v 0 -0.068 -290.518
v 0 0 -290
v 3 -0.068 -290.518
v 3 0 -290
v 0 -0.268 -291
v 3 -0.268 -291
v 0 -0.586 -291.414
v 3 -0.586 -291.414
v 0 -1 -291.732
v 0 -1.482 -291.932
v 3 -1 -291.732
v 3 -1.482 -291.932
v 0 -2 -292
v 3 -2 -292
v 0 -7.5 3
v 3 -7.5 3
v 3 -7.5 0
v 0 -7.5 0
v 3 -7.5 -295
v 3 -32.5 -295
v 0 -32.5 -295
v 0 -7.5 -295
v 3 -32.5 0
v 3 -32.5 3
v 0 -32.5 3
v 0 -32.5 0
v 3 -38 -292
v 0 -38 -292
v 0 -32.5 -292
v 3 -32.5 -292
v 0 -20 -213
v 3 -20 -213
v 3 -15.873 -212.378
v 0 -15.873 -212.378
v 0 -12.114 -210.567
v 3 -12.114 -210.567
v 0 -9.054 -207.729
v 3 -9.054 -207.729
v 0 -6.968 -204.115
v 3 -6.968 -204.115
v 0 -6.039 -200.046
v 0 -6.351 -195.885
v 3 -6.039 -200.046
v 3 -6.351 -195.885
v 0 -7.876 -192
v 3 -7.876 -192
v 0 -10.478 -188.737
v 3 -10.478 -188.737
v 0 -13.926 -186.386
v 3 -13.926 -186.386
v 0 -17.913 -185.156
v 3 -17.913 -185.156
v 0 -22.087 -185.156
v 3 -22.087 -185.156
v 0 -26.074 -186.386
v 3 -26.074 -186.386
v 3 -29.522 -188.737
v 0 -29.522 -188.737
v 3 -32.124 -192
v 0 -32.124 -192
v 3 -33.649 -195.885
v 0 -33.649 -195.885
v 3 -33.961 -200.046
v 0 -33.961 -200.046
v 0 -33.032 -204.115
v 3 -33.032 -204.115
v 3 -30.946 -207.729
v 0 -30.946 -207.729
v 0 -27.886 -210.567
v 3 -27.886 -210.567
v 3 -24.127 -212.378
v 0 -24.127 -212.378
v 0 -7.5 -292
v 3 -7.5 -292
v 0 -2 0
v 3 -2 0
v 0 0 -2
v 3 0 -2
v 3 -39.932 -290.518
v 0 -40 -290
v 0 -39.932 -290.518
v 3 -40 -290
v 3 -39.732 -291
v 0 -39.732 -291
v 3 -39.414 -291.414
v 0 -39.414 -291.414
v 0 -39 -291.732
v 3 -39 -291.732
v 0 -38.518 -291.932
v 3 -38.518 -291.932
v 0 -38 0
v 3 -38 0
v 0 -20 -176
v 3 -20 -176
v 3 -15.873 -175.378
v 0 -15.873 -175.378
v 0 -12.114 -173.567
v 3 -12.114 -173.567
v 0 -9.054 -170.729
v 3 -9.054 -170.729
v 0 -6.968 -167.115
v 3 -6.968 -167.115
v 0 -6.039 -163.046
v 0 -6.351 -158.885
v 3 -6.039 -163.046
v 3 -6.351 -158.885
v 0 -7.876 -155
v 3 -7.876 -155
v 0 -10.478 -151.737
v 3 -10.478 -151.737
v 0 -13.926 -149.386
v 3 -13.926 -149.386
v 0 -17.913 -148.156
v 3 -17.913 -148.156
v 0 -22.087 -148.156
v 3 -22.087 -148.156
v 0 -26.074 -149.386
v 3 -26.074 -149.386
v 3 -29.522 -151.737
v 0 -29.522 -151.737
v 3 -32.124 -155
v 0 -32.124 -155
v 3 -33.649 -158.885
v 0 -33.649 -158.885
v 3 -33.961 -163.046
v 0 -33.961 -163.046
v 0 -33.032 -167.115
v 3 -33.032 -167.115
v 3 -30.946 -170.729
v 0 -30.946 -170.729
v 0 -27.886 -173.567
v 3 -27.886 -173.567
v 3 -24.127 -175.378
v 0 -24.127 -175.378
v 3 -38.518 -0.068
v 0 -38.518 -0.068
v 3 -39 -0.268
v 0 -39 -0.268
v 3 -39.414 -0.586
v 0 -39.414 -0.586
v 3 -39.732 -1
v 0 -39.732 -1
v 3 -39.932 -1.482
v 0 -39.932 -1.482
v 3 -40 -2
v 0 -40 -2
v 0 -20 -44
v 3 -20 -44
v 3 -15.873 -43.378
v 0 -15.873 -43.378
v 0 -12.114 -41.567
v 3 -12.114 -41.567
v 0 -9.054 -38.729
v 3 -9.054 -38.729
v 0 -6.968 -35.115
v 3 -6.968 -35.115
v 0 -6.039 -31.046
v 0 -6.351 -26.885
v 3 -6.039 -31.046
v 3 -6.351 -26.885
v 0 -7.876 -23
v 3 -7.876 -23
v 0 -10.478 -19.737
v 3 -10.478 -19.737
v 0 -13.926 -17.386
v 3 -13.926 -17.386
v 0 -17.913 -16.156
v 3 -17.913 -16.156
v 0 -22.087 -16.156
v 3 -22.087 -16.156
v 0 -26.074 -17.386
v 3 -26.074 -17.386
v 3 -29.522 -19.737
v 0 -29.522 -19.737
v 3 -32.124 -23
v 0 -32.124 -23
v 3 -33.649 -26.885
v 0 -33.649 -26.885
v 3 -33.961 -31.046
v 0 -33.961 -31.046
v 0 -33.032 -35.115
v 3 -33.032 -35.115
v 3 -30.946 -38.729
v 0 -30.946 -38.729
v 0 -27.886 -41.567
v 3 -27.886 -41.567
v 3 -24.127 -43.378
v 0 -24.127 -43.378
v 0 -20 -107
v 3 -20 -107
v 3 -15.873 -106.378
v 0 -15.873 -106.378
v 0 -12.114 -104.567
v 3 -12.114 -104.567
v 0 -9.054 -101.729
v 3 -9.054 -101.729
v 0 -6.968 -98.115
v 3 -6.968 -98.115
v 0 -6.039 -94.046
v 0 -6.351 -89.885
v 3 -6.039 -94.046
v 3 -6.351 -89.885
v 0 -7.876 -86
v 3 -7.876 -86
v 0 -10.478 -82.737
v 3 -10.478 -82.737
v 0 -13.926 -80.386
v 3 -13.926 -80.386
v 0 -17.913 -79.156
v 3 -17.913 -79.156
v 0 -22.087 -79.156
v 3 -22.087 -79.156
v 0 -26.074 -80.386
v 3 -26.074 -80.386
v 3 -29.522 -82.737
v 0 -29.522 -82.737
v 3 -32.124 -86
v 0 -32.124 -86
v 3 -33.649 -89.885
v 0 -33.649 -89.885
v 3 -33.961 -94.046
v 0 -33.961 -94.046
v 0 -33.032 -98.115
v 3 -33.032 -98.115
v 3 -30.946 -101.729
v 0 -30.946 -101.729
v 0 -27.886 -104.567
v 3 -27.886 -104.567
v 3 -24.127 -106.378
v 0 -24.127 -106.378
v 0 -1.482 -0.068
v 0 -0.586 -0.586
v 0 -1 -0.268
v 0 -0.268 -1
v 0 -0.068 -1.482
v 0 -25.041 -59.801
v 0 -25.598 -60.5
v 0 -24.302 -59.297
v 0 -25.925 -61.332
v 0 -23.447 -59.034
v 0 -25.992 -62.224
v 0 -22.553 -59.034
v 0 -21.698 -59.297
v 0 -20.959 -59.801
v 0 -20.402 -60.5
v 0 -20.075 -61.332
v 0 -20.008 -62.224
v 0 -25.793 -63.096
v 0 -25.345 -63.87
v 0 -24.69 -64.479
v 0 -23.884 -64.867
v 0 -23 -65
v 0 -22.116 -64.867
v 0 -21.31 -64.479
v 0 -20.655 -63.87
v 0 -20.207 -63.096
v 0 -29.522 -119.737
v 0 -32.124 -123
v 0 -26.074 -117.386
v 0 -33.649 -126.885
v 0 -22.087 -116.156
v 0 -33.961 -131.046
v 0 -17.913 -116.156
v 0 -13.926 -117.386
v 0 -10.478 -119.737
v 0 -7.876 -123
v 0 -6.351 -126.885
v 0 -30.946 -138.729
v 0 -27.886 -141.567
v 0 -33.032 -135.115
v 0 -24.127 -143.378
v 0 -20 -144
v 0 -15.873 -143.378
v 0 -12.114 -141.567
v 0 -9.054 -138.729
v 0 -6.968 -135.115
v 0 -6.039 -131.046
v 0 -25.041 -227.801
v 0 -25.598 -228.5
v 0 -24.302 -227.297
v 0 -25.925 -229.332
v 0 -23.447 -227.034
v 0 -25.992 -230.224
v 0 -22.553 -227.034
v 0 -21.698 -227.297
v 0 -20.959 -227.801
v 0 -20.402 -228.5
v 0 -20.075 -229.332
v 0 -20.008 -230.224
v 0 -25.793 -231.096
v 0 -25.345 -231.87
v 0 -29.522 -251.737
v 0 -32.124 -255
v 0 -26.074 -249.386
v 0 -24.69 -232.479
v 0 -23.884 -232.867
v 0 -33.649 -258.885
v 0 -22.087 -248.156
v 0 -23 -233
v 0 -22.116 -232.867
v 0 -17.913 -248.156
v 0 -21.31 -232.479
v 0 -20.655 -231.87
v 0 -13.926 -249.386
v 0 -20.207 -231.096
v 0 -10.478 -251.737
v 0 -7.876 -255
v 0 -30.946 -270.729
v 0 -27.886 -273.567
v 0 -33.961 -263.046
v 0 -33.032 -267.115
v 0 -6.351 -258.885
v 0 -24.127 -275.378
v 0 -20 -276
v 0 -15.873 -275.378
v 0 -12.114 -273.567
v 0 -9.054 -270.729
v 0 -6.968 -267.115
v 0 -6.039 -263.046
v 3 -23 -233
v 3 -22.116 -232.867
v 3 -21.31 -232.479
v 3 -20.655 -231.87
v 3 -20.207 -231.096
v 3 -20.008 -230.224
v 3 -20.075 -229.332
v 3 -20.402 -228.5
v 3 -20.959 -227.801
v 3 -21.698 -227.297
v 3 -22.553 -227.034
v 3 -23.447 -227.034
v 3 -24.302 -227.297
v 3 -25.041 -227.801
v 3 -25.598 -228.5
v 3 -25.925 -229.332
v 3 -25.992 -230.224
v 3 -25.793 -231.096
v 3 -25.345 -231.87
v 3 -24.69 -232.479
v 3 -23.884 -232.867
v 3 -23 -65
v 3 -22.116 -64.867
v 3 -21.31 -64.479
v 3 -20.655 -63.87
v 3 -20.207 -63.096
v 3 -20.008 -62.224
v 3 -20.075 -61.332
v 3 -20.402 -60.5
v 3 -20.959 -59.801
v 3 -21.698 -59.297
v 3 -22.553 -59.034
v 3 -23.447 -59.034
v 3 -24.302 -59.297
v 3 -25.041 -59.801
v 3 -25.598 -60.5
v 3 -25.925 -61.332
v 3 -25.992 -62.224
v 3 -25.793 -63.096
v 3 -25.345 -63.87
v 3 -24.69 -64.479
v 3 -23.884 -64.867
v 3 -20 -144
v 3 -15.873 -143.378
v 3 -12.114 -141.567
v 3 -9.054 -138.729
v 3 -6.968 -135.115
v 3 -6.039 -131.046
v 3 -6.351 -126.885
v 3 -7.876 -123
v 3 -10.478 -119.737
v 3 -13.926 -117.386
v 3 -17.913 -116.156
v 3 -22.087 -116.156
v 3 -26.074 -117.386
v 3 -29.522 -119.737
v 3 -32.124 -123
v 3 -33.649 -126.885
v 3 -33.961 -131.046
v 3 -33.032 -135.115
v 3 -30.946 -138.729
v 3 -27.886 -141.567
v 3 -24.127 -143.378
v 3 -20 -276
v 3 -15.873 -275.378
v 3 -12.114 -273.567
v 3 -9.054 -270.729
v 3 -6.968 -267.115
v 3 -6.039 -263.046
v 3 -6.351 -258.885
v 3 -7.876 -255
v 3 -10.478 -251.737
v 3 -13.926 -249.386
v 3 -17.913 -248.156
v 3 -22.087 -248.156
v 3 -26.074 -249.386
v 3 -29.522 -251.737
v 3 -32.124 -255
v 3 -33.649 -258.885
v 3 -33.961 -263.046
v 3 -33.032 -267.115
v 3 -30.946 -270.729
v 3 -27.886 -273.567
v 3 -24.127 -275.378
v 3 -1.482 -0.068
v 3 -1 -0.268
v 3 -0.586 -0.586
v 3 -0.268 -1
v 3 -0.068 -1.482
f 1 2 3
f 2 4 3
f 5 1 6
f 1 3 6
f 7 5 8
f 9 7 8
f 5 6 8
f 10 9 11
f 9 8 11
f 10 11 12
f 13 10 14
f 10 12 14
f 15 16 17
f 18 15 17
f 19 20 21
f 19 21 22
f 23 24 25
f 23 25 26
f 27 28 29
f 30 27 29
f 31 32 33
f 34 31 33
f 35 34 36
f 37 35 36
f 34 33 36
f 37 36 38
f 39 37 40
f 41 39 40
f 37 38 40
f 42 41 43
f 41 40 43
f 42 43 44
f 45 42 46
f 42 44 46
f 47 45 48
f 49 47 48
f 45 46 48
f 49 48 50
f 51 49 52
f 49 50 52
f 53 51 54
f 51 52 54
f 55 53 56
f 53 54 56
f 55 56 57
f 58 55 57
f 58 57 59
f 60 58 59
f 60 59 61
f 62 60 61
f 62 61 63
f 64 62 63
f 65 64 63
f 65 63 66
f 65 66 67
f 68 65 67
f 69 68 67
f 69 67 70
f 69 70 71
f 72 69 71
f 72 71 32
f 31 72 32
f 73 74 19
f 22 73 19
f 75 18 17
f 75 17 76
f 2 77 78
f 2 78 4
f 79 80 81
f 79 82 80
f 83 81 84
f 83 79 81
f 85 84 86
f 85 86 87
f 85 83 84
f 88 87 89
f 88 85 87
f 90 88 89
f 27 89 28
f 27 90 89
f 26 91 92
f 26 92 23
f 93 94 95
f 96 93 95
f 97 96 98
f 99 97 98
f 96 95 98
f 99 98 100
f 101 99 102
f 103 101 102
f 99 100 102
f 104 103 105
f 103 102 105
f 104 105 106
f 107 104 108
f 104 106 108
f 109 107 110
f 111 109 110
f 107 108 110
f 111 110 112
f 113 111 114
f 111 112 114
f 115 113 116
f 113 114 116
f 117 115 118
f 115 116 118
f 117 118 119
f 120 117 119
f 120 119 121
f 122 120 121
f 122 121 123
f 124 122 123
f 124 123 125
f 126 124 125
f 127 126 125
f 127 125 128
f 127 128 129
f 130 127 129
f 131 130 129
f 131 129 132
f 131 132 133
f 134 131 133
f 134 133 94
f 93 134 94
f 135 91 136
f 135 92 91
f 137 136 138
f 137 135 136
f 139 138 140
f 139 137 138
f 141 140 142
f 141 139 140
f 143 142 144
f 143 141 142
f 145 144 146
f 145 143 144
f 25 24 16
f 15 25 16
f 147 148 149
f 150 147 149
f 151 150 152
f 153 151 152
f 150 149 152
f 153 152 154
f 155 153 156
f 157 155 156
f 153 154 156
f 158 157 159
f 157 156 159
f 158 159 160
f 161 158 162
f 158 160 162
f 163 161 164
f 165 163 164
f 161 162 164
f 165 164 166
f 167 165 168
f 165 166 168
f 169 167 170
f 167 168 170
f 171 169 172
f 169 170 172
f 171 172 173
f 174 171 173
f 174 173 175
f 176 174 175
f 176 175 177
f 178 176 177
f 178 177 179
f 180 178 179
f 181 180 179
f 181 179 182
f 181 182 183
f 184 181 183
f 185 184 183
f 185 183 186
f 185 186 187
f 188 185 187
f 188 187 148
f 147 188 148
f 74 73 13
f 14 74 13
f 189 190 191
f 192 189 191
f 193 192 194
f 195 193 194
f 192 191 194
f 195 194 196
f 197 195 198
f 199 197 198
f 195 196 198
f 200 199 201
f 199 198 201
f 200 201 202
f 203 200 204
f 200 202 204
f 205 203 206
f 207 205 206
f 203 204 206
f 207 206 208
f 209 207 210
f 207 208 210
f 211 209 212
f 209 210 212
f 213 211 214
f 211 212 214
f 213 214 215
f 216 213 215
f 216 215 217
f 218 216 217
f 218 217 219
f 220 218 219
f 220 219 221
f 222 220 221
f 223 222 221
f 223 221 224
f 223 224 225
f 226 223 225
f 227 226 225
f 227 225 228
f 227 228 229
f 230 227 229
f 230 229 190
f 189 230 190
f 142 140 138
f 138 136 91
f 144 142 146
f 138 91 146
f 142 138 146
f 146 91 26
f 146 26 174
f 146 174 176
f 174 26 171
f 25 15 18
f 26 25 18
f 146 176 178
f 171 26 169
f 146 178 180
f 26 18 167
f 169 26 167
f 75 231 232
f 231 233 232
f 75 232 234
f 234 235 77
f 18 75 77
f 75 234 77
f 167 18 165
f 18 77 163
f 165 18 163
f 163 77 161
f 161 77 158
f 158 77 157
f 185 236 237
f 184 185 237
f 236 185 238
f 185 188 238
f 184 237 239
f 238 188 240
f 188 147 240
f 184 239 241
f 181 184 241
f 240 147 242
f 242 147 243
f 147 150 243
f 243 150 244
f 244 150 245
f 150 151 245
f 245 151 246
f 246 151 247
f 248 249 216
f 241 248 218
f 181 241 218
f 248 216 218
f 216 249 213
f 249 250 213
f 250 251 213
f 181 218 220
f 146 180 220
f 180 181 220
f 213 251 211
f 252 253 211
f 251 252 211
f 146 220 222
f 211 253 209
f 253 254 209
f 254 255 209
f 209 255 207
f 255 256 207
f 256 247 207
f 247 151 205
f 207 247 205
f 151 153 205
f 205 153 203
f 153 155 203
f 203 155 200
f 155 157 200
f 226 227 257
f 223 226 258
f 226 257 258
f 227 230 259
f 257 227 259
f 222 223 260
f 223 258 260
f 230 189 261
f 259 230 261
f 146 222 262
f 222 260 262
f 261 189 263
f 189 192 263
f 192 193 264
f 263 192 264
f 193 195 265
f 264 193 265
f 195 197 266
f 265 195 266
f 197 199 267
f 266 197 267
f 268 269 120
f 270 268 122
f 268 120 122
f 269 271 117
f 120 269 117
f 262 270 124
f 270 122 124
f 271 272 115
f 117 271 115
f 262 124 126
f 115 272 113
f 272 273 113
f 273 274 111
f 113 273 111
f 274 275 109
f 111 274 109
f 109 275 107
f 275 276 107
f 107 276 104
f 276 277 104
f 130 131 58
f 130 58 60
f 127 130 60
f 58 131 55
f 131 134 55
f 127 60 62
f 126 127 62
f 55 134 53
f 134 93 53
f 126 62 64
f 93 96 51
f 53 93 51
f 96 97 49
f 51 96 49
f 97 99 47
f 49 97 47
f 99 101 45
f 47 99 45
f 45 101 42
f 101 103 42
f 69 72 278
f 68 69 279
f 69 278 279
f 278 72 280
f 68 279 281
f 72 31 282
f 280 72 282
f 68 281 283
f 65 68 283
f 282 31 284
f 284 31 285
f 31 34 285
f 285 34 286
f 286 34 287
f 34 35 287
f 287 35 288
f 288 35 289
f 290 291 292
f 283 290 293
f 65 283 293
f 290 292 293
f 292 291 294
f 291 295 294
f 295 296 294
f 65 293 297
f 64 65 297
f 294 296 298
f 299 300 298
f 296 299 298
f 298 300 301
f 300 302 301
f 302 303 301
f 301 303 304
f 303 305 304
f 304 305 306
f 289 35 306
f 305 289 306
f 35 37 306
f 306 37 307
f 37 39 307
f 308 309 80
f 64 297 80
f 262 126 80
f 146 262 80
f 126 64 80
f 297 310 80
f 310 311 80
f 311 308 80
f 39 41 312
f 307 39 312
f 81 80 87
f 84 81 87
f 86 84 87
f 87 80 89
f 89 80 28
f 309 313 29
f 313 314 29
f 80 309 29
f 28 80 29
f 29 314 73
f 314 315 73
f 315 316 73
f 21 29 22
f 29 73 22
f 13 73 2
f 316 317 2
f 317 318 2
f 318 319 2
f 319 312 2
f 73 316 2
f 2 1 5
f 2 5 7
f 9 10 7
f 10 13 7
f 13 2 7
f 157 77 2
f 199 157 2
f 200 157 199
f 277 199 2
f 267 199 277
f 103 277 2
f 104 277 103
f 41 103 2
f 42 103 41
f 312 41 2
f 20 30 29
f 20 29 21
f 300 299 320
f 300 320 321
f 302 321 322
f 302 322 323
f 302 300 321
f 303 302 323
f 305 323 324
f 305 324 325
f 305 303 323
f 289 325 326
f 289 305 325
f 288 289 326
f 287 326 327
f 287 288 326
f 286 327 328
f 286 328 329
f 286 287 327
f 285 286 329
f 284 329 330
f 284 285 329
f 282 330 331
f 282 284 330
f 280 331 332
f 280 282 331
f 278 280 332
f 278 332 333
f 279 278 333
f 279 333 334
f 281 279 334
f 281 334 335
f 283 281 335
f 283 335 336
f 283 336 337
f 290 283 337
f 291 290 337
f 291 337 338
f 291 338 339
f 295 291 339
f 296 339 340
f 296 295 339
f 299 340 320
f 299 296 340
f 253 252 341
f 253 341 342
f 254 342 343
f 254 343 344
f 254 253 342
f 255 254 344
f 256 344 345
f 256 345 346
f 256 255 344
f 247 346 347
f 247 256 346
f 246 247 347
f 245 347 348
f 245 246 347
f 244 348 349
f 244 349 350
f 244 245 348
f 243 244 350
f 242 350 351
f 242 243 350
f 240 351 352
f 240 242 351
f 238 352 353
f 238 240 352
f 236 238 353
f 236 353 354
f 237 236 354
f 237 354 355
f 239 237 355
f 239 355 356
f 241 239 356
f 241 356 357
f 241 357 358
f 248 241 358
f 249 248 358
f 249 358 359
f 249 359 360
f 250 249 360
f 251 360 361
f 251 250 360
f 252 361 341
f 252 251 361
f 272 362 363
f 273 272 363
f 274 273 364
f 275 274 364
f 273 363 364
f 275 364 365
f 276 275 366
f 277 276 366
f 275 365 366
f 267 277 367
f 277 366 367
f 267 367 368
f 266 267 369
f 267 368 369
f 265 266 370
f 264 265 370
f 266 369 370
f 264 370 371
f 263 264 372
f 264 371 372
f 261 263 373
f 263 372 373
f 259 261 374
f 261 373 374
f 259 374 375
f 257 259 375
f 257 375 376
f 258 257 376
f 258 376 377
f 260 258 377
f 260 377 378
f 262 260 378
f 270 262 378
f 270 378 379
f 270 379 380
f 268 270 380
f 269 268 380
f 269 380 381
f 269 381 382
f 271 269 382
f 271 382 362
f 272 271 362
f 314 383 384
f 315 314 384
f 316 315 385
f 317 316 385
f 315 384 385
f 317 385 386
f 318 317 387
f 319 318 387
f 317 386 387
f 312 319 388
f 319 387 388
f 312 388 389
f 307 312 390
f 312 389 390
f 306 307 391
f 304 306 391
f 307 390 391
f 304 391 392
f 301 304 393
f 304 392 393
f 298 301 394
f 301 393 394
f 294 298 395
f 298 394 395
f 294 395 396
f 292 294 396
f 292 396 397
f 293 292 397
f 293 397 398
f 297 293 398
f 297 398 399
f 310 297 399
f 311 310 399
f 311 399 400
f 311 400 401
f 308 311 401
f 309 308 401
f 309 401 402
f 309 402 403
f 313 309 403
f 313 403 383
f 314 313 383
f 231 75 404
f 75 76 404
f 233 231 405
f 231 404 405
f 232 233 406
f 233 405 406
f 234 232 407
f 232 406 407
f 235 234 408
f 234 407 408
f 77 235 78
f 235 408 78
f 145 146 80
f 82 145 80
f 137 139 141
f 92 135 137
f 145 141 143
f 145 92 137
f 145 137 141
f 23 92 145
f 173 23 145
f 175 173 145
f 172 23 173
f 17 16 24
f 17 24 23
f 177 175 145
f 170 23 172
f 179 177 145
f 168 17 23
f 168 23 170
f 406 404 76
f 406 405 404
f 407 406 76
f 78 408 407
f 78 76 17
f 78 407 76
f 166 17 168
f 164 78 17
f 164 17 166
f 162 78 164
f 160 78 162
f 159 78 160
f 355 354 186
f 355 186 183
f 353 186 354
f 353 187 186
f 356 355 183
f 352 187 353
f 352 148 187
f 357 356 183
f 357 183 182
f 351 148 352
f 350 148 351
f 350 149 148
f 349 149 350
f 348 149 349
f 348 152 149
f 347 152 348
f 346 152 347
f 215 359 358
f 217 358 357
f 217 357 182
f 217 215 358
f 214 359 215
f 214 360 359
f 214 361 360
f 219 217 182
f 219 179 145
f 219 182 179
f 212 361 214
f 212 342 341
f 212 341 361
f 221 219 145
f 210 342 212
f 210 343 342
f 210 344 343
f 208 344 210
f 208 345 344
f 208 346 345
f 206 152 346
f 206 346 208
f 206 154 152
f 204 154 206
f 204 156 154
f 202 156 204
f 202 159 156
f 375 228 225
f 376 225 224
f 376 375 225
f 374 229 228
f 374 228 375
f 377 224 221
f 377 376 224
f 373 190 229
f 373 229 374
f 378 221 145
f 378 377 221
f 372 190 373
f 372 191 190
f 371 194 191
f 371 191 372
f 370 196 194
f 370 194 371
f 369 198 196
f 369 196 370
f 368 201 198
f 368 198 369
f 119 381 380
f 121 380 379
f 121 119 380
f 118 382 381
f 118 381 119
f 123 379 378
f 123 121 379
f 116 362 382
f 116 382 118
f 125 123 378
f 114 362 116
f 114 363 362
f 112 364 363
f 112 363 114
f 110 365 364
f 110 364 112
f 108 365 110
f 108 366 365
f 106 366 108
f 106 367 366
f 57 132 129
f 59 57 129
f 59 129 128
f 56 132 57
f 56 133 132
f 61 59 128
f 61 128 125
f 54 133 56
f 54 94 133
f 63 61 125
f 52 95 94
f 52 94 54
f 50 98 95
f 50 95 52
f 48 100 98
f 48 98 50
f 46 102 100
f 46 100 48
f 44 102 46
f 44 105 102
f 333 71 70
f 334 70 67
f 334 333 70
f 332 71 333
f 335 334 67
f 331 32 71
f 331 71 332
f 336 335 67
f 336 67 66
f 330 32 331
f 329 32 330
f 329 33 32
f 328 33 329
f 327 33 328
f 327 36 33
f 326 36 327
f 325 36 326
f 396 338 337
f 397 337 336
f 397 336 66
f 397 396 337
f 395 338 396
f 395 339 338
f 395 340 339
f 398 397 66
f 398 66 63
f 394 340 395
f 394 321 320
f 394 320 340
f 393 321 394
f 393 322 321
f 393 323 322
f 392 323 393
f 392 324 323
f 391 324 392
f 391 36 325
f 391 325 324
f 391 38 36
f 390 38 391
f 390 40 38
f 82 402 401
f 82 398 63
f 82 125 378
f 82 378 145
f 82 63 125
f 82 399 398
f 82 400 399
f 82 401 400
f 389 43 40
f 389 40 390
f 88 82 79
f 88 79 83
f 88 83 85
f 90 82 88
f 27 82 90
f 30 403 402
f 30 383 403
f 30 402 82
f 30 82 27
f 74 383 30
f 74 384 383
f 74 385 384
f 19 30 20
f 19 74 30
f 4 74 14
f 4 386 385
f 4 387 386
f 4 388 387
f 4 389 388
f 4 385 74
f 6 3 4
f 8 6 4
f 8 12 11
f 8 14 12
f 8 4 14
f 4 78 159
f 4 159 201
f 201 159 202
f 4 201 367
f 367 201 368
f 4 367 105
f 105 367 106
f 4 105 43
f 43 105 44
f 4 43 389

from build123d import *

# Parameters (mm, degrees)
SKETCH3_W           = 292
SKETCH3_H           = 40
SKETCH3_R           = 3
BOSS_EXTRUDE2_DEPTH = 3
FILLET1_R           = 2
SKETCH4_R           = 14
CUT_EXTRUDE1_DEPTH  = 10
SKETCH5_W           = 3
SKETCH5_H           = 25
BOSS_EXTRUDE3_DEPTH = 3


with BuildPart() as part:
    # Sketch3 → Boss-Extrude2 (new body)
    with BuildSketch(Plane(origin=(0, 0, 0), x_dir=(0, 0, -1), z_dir=(1, 0, 0))):
        with Locations((146, -20)):
            Rectangle(SKETCH3_W, SKETCH3_H)
        with Locations((62, -23)):
            Circle(SKETCH3_R, mode=Mode.SUBTRACT)
        with Locations((230, -23)):
            Circle(SKETCH3_R, mode=Mode.SUBTRACT)
    extrude(amount=BOSS_EXTRUDE2_DEPTH)

    # Fillet1
    fillet1_edges = [part.edges().sort_by_distance(p)[0] for p in [
        (1.5, -40, -292),
        (1.5, -40, 0),
        (1.5, 0, 0),
        (1.5, 0, -292),
    ]]
    fillet(fillet1_edges, radius=FILLET1_R)

    # Sketch4 → Cut-Extrude1 (cut)
    with BuildSketch(Plane(origin=(3, 0, 0), x_dir=(0, 0, -1), z_dir=(1, 0, 0))):
        with Locations((30, -20)):
            Circle(SKETCH4_R)
        with Locations((93, -20)):
            Circle(SKETCH4_R)
        with Locations((130, -20)):
            Circle(SKETCH4_R)
        with Locations((162, -20)):
            Circle(SKETCH4_R)
        with Locations((199, -20)):
            Circle(SKETCH4_R)
        with Locations((262, -20)):
            Circle(SKETCH4_R)
    extrude(amount=-CUT_EXTRUDE1_DEPTH, mode=Mode.SUBTRACT)

    # Sketch5 → Boss-Extrude3 (add)
    with BuildSketch(Plane(origin=(3, 0, 0), x_dir=(0, 0, -1), z_dir=(1, 0, 0))):
        with Locations((-1.5, -20)):
            Rectangle(SKETCH5_W, SKETCH5_H)
        with Locations((293.5, -20)):
            Rectangle(SKETCH5_W, SKETCH5_H)
    extrude(amount=-BOSS_EXTRUDE3_DEPTH)


solid = part.part
